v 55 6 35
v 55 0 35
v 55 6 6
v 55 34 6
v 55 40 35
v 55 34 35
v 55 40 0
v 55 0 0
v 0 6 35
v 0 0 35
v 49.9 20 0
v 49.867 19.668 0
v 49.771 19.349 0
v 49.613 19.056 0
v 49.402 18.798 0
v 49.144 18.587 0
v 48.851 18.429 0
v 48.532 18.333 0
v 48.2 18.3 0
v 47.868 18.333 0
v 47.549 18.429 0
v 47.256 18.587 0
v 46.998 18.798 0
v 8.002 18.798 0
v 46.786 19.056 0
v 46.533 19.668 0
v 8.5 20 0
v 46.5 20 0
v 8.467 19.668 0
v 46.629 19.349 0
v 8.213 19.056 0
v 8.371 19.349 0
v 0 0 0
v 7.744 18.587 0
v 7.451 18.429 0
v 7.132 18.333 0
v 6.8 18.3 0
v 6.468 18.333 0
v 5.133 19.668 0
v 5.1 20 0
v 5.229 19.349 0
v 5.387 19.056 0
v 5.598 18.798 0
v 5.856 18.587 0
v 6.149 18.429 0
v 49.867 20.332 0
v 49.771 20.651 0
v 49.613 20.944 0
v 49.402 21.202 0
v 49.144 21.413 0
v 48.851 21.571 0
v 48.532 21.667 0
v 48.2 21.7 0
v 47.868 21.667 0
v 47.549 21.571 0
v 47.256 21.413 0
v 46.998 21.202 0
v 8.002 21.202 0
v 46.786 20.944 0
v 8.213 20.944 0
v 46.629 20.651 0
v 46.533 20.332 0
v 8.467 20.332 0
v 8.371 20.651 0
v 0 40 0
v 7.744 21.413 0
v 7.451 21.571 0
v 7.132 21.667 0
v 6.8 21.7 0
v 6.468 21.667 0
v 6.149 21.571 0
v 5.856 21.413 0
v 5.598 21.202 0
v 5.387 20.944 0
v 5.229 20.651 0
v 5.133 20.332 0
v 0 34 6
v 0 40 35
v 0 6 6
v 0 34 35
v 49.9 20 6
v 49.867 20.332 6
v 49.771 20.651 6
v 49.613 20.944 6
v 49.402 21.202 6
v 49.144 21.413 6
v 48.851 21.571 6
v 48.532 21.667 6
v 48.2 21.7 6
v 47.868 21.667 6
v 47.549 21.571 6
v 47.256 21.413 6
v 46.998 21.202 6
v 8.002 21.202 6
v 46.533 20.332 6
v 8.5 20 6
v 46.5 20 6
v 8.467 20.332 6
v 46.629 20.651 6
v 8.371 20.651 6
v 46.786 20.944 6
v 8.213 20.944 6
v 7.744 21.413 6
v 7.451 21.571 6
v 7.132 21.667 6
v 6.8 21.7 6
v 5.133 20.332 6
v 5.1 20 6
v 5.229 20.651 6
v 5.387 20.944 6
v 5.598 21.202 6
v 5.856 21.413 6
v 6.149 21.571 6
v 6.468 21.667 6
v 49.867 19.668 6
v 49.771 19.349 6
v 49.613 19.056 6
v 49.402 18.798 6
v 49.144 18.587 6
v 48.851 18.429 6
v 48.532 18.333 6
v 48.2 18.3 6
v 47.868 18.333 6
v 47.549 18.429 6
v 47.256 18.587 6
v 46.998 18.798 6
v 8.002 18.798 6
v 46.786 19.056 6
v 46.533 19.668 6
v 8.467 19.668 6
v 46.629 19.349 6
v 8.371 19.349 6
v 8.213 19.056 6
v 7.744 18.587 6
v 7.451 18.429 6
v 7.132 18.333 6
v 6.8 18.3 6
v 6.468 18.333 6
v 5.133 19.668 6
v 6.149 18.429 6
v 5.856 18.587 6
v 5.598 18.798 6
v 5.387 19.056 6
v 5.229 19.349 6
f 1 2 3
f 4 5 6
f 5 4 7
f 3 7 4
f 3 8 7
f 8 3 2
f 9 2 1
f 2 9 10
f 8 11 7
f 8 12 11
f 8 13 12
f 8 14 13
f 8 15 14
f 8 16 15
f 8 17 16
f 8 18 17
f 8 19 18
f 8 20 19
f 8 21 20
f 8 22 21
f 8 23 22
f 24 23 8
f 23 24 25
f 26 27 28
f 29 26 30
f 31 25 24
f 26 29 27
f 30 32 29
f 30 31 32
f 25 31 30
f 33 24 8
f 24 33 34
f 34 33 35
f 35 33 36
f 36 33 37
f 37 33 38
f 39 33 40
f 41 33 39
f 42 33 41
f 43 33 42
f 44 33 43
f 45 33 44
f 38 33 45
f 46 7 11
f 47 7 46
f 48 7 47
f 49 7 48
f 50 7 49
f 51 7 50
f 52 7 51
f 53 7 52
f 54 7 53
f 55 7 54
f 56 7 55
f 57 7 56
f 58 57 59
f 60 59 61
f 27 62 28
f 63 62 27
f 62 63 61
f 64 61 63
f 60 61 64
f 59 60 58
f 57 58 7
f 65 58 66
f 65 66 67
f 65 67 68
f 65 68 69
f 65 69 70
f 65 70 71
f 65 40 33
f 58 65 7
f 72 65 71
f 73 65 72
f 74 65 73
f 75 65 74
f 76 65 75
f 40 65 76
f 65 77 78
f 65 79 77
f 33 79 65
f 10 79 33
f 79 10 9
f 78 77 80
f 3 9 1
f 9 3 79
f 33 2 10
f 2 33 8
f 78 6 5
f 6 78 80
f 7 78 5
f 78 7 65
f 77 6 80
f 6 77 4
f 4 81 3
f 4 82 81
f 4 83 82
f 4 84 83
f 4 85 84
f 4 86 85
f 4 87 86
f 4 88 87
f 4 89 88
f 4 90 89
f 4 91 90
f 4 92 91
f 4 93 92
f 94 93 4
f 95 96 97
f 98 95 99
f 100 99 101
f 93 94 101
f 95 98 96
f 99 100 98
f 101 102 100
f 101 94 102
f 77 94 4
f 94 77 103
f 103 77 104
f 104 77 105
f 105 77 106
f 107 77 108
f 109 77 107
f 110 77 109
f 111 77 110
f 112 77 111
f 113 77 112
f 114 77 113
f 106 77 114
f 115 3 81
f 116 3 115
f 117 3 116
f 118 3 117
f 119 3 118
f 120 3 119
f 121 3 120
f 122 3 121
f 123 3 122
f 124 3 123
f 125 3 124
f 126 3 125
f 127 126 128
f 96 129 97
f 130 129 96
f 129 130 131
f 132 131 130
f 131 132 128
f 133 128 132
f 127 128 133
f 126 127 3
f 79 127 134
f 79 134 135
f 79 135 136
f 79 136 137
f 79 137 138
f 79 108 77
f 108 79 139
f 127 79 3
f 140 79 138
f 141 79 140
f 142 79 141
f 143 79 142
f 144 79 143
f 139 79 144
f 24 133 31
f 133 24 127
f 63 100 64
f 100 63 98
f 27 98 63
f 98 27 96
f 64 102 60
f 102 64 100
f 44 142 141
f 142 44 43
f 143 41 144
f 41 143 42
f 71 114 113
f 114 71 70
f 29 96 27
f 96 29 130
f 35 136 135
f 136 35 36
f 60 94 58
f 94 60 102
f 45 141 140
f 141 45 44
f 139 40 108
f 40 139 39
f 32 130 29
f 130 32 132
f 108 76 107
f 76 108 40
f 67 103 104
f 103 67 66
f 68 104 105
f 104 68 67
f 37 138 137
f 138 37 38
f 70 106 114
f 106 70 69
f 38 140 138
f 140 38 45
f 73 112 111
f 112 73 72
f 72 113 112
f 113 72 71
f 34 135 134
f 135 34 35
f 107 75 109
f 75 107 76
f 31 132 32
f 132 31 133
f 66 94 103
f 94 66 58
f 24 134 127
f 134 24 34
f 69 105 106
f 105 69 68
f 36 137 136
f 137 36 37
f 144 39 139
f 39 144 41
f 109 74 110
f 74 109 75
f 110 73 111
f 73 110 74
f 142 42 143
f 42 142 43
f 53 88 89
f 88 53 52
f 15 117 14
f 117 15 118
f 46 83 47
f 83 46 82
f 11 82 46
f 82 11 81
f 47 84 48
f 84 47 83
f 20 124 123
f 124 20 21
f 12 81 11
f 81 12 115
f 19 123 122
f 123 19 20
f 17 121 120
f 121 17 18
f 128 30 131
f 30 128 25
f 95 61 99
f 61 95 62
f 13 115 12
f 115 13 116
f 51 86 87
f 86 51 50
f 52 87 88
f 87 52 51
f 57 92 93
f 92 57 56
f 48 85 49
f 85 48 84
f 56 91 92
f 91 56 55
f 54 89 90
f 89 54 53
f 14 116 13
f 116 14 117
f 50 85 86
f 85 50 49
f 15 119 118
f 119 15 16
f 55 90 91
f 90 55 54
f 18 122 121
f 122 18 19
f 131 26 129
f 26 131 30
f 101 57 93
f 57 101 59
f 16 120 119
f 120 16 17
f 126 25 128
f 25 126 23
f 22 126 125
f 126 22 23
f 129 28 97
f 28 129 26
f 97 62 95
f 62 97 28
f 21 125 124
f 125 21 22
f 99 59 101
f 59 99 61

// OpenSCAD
$fn = 32;

// ----------------------------------------------------------------------
// U-bracket: 55 x 40 x 35 mm
// ----------------------------------------------------------------------

// --- parameters (mm) ---
span = 55;                // outer length, X
outer_w = 40;             // outer width, Y
wall_h = 35;              // upright height, Z
plate_t = 6;              // wall thickness
hole_d = 3.4;             // clearance for M3

module hole_z(px, py) {
  translate([px, py, -0.5]) cylinder(h = plate_t + 1, d = hole_d);
}
module hole_y_pz(pz) {
  /* through both uprights along Y */
  translate([0, -0.5, pz]) rotate([-90, 0, 0]) cylinder(h = outer_w + 1, d = hole_d);
}

module base() {
  cube([span, outer_w, plate_t]);
}

module uprights() {
  cube([span, plate_t, wall_h]);
  translate([0, outer_w - plate_t, 0]) cube([span, plate_t, wall_h]);
}

difference() {
  union() {
    base();
    uprights();
  }
  hole_z(6.8, 20);
  hole_z(48.2, 20);
}
